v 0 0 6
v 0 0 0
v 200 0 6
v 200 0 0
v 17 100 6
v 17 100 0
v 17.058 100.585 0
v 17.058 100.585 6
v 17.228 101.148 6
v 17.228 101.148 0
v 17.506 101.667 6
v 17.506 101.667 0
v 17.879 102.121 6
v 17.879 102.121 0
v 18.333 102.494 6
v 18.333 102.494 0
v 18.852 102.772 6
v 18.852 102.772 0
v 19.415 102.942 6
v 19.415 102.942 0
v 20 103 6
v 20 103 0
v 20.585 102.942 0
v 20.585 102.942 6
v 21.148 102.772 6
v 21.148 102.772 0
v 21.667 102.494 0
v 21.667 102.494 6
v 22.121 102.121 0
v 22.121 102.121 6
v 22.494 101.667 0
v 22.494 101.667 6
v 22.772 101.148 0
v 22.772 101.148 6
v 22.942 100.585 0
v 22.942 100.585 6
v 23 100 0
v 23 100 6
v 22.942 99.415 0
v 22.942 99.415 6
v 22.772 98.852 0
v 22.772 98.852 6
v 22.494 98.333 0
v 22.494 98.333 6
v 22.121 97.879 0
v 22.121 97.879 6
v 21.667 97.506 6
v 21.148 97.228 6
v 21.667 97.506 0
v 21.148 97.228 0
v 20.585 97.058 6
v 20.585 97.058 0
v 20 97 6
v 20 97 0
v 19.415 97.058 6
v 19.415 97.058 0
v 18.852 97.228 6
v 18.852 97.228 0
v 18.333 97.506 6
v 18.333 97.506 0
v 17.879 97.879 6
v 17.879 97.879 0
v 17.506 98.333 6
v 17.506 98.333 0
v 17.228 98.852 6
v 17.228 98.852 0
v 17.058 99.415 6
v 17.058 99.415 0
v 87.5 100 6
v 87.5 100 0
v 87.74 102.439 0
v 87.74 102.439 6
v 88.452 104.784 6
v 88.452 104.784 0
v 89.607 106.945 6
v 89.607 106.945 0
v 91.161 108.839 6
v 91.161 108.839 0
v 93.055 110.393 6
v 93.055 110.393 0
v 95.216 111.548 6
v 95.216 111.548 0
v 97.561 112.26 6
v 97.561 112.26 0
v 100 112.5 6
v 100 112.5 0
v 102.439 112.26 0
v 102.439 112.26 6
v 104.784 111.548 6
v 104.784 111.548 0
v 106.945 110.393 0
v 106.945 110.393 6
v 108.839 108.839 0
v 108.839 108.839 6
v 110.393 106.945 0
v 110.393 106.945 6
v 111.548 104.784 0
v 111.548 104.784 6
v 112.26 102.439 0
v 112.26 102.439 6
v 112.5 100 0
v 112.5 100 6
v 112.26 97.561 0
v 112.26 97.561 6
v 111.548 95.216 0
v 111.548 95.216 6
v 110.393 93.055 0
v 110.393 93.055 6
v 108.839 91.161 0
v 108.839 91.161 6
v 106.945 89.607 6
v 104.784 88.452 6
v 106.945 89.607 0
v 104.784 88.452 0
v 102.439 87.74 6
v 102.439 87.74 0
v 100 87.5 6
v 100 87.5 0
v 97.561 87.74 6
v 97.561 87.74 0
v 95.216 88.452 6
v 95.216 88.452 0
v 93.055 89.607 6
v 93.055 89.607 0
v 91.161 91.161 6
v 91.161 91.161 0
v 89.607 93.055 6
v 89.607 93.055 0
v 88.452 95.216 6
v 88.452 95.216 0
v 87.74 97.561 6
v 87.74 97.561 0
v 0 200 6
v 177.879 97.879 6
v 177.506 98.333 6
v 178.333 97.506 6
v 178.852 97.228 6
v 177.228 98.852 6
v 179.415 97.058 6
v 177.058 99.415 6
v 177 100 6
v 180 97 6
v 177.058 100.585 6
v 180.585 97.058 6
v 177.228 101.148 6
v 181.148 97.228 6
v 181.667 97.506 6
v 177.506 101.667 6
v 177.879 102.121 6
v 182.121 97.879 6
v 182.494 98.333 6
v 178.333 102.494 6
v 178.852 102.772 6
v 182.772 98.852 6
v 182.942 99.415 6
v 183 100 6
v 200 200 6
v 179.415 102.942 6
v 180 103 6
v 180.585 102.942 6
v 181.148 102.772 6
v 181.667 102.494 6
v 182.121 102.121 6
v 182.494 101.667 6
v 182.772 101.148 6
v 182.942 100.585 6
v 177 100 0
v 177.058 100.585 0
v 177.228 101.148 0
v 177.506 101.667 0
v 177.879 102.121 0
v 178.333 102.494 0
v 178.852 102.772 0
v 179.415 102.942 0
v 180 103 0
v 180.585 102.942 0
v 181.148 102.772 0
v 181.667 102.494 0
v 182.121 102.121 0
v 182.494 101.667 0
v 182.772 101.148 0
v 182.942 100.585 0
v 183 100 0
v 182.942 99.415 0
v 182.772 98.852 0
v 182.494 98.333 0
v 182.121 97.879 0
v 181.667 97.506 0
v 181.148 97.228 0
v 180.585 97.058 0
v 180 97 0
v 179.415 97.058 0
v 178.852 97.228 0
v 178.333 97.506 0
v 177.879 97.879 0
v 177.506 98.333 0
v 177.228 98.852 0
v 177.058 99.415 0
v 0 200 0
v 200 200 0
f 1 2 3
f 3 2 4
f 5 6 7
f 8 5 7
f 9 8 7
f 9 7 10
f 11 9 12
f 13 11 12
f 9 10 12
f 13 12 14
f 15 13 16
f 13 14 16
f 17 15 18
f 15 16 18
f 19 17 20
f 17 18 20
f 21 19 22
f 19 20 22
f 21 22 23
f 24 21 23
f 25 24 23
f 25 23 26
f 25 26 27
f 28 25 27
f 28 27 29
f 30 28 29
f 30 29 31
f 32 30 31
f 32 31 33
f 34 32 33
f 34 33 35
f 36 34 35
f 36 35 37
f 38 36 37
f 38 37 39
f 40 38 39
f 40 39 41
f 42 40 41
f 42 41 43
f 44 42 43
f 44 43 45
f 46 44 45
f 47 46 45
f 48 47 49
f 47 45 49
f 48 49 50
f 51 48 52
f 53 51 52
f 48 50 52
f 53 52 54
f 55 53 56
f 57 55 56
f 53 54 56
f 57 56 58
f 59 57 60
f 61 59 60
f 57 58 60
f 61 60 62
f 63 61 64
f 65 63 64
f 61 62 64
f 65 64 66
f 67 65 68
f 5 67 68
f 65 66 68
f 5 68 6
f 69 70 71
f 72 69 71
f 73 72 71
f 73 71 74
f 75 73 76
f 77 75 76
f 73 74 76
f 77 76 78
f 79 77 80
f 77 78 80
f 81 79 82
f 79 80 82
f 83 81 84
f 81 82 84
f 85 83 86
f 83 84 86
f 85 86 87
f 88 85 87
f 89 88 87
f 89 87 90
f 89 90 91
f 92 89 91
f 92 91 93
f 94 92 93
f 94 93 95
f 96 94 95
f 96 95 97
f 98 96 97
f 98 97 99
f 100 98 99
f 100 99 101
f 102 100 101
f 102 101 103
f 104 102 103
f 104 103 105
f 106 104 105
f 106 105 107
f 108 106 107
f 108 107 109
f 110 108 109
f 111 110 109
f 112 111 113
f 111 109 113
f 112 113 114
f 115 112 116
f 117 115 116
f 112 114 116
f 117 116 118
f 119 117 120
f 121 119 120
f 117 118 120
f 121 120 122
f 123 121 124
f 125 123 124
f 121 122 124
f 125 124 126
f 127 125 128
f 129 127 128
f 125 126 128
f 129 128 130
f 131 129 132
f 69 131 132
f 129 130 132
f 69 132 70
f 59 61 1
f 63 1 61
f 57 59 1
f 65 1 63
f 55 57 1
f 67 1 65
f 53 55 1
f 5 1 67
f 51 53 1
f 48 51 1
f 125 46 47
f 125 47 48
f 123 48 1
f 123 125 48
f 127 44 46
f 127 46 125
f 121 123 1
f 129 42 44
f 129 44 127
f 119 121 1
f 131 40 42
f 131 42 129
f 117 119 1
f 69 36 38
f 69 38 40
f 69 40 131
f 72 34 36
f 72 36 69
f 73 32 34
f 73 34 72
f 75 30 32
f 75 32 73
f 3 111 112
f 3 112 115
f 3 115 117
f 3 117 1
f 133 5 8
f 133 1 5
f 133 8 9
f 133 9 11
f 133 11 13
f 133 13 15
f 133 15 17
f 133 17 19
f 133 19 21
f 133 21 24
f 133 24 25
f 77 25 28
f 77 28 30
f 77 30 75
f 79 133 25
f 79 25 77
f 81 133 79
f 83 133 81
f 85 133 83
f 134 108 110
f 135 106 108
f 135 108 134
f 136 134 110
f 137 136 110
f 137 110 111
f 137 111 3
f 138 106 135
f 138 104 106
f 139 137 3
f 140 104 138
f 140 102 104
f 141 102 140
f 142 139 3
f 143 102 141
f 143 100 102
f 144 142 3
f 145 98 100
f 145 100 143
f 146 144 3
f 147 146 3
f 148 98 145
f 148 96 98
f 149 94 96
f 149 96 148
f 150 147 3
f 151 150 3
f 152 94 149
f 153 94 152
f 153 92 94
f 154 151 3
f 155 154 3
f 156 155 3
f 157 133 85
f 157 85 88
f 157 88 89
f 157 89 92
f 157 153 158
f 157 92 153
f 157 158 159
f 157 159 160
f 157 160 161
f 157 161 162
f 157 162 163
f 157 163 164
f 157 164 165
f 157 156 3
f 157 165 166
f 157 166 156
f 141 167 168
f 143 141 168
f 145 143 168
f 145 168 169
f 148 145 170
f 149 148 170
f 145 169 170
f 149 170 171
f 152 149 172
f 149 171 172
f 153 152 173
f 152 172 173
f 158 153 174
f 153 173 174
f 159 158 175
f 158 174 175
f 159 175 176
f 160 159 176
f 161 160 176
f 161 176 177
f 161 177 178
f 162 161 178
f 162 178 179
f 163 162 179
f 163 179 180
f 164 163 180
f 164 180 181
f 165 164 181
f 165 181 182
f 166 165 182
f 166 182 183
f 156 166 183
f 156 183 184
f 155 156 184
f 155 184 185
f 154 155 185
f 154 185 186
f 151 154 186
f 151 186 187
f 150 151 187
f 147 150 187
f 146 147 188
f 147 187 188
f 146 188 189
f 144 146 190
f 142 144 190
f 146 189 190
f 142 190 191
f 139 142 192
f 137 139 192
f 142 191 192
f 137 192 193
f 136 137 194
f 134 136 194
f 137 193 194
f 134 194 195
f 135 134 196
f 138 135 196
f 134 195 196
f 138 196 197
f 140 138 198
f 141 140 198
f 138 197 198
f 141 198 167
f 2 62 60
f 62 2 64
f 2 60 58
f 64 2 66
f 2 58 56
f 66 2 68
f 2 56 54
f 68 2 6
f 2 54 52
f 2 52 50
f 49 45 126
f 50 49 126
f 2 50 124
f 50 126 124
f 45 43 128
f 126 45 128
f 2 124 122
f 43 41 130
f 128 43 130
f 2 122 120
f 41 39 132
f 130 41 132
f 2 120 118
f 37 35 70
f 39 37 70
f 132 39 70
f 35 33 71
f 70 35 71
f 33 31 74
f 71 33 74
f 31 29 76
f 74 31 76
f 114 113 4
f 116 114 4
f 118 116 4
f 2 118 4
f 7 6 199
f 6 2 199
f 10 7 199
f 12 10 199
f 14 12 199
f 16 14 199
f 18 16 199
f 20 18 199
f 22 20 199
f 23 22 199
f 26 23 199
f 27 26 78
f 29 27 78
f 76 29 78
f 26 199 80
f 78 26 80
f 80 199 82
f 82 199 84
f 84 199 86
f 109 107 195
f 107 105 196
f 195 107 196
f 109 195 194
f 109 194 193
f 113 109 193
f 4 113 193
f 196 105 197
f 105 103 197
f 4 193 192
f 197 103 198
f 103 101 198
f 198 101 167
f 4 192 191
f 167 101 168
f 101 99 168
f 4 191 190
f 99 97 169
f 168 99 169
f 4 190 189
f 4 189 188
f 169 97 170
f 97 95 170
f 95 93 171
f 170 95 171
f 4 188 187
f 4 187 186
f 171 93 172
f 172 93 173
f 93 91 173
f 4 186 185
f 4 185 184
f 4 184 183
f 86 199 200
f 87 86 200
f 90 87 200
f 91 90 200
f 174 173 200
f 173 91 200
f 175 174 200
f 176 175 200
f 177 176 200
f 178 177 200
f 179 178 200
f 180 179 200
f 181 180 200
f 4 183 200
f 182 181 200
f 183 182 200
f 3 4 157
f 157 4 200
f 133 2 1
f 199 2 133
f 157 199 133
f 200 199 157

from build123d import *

# Parameters (mm, degrees)
F0_W     = 200
F0_H     = 200
F1_DEPTH = 6
F3_D     = 6
F5_D     = 25


with BuildPart() as f1:
    # F0 (on Top) → F1 (new body)
    with BuildSketch(Plane.XY):
        with Locations((100, 100)):
            Rectangle(F0_W, F0_H)
    extrude(amount=F1_DEPTH)

    # F3 (through all)
    with Locations(Plane.XY.offset(6)):
        with Locations((20, 100), (180, 100)):
            Hole(F3_D / 2)

    # F5 (through all)
    with Locations(Plane.XY.offset(6)):
        with Locations((100, 100)):
            Hole(F5_D / 2)


solid = f1.part
